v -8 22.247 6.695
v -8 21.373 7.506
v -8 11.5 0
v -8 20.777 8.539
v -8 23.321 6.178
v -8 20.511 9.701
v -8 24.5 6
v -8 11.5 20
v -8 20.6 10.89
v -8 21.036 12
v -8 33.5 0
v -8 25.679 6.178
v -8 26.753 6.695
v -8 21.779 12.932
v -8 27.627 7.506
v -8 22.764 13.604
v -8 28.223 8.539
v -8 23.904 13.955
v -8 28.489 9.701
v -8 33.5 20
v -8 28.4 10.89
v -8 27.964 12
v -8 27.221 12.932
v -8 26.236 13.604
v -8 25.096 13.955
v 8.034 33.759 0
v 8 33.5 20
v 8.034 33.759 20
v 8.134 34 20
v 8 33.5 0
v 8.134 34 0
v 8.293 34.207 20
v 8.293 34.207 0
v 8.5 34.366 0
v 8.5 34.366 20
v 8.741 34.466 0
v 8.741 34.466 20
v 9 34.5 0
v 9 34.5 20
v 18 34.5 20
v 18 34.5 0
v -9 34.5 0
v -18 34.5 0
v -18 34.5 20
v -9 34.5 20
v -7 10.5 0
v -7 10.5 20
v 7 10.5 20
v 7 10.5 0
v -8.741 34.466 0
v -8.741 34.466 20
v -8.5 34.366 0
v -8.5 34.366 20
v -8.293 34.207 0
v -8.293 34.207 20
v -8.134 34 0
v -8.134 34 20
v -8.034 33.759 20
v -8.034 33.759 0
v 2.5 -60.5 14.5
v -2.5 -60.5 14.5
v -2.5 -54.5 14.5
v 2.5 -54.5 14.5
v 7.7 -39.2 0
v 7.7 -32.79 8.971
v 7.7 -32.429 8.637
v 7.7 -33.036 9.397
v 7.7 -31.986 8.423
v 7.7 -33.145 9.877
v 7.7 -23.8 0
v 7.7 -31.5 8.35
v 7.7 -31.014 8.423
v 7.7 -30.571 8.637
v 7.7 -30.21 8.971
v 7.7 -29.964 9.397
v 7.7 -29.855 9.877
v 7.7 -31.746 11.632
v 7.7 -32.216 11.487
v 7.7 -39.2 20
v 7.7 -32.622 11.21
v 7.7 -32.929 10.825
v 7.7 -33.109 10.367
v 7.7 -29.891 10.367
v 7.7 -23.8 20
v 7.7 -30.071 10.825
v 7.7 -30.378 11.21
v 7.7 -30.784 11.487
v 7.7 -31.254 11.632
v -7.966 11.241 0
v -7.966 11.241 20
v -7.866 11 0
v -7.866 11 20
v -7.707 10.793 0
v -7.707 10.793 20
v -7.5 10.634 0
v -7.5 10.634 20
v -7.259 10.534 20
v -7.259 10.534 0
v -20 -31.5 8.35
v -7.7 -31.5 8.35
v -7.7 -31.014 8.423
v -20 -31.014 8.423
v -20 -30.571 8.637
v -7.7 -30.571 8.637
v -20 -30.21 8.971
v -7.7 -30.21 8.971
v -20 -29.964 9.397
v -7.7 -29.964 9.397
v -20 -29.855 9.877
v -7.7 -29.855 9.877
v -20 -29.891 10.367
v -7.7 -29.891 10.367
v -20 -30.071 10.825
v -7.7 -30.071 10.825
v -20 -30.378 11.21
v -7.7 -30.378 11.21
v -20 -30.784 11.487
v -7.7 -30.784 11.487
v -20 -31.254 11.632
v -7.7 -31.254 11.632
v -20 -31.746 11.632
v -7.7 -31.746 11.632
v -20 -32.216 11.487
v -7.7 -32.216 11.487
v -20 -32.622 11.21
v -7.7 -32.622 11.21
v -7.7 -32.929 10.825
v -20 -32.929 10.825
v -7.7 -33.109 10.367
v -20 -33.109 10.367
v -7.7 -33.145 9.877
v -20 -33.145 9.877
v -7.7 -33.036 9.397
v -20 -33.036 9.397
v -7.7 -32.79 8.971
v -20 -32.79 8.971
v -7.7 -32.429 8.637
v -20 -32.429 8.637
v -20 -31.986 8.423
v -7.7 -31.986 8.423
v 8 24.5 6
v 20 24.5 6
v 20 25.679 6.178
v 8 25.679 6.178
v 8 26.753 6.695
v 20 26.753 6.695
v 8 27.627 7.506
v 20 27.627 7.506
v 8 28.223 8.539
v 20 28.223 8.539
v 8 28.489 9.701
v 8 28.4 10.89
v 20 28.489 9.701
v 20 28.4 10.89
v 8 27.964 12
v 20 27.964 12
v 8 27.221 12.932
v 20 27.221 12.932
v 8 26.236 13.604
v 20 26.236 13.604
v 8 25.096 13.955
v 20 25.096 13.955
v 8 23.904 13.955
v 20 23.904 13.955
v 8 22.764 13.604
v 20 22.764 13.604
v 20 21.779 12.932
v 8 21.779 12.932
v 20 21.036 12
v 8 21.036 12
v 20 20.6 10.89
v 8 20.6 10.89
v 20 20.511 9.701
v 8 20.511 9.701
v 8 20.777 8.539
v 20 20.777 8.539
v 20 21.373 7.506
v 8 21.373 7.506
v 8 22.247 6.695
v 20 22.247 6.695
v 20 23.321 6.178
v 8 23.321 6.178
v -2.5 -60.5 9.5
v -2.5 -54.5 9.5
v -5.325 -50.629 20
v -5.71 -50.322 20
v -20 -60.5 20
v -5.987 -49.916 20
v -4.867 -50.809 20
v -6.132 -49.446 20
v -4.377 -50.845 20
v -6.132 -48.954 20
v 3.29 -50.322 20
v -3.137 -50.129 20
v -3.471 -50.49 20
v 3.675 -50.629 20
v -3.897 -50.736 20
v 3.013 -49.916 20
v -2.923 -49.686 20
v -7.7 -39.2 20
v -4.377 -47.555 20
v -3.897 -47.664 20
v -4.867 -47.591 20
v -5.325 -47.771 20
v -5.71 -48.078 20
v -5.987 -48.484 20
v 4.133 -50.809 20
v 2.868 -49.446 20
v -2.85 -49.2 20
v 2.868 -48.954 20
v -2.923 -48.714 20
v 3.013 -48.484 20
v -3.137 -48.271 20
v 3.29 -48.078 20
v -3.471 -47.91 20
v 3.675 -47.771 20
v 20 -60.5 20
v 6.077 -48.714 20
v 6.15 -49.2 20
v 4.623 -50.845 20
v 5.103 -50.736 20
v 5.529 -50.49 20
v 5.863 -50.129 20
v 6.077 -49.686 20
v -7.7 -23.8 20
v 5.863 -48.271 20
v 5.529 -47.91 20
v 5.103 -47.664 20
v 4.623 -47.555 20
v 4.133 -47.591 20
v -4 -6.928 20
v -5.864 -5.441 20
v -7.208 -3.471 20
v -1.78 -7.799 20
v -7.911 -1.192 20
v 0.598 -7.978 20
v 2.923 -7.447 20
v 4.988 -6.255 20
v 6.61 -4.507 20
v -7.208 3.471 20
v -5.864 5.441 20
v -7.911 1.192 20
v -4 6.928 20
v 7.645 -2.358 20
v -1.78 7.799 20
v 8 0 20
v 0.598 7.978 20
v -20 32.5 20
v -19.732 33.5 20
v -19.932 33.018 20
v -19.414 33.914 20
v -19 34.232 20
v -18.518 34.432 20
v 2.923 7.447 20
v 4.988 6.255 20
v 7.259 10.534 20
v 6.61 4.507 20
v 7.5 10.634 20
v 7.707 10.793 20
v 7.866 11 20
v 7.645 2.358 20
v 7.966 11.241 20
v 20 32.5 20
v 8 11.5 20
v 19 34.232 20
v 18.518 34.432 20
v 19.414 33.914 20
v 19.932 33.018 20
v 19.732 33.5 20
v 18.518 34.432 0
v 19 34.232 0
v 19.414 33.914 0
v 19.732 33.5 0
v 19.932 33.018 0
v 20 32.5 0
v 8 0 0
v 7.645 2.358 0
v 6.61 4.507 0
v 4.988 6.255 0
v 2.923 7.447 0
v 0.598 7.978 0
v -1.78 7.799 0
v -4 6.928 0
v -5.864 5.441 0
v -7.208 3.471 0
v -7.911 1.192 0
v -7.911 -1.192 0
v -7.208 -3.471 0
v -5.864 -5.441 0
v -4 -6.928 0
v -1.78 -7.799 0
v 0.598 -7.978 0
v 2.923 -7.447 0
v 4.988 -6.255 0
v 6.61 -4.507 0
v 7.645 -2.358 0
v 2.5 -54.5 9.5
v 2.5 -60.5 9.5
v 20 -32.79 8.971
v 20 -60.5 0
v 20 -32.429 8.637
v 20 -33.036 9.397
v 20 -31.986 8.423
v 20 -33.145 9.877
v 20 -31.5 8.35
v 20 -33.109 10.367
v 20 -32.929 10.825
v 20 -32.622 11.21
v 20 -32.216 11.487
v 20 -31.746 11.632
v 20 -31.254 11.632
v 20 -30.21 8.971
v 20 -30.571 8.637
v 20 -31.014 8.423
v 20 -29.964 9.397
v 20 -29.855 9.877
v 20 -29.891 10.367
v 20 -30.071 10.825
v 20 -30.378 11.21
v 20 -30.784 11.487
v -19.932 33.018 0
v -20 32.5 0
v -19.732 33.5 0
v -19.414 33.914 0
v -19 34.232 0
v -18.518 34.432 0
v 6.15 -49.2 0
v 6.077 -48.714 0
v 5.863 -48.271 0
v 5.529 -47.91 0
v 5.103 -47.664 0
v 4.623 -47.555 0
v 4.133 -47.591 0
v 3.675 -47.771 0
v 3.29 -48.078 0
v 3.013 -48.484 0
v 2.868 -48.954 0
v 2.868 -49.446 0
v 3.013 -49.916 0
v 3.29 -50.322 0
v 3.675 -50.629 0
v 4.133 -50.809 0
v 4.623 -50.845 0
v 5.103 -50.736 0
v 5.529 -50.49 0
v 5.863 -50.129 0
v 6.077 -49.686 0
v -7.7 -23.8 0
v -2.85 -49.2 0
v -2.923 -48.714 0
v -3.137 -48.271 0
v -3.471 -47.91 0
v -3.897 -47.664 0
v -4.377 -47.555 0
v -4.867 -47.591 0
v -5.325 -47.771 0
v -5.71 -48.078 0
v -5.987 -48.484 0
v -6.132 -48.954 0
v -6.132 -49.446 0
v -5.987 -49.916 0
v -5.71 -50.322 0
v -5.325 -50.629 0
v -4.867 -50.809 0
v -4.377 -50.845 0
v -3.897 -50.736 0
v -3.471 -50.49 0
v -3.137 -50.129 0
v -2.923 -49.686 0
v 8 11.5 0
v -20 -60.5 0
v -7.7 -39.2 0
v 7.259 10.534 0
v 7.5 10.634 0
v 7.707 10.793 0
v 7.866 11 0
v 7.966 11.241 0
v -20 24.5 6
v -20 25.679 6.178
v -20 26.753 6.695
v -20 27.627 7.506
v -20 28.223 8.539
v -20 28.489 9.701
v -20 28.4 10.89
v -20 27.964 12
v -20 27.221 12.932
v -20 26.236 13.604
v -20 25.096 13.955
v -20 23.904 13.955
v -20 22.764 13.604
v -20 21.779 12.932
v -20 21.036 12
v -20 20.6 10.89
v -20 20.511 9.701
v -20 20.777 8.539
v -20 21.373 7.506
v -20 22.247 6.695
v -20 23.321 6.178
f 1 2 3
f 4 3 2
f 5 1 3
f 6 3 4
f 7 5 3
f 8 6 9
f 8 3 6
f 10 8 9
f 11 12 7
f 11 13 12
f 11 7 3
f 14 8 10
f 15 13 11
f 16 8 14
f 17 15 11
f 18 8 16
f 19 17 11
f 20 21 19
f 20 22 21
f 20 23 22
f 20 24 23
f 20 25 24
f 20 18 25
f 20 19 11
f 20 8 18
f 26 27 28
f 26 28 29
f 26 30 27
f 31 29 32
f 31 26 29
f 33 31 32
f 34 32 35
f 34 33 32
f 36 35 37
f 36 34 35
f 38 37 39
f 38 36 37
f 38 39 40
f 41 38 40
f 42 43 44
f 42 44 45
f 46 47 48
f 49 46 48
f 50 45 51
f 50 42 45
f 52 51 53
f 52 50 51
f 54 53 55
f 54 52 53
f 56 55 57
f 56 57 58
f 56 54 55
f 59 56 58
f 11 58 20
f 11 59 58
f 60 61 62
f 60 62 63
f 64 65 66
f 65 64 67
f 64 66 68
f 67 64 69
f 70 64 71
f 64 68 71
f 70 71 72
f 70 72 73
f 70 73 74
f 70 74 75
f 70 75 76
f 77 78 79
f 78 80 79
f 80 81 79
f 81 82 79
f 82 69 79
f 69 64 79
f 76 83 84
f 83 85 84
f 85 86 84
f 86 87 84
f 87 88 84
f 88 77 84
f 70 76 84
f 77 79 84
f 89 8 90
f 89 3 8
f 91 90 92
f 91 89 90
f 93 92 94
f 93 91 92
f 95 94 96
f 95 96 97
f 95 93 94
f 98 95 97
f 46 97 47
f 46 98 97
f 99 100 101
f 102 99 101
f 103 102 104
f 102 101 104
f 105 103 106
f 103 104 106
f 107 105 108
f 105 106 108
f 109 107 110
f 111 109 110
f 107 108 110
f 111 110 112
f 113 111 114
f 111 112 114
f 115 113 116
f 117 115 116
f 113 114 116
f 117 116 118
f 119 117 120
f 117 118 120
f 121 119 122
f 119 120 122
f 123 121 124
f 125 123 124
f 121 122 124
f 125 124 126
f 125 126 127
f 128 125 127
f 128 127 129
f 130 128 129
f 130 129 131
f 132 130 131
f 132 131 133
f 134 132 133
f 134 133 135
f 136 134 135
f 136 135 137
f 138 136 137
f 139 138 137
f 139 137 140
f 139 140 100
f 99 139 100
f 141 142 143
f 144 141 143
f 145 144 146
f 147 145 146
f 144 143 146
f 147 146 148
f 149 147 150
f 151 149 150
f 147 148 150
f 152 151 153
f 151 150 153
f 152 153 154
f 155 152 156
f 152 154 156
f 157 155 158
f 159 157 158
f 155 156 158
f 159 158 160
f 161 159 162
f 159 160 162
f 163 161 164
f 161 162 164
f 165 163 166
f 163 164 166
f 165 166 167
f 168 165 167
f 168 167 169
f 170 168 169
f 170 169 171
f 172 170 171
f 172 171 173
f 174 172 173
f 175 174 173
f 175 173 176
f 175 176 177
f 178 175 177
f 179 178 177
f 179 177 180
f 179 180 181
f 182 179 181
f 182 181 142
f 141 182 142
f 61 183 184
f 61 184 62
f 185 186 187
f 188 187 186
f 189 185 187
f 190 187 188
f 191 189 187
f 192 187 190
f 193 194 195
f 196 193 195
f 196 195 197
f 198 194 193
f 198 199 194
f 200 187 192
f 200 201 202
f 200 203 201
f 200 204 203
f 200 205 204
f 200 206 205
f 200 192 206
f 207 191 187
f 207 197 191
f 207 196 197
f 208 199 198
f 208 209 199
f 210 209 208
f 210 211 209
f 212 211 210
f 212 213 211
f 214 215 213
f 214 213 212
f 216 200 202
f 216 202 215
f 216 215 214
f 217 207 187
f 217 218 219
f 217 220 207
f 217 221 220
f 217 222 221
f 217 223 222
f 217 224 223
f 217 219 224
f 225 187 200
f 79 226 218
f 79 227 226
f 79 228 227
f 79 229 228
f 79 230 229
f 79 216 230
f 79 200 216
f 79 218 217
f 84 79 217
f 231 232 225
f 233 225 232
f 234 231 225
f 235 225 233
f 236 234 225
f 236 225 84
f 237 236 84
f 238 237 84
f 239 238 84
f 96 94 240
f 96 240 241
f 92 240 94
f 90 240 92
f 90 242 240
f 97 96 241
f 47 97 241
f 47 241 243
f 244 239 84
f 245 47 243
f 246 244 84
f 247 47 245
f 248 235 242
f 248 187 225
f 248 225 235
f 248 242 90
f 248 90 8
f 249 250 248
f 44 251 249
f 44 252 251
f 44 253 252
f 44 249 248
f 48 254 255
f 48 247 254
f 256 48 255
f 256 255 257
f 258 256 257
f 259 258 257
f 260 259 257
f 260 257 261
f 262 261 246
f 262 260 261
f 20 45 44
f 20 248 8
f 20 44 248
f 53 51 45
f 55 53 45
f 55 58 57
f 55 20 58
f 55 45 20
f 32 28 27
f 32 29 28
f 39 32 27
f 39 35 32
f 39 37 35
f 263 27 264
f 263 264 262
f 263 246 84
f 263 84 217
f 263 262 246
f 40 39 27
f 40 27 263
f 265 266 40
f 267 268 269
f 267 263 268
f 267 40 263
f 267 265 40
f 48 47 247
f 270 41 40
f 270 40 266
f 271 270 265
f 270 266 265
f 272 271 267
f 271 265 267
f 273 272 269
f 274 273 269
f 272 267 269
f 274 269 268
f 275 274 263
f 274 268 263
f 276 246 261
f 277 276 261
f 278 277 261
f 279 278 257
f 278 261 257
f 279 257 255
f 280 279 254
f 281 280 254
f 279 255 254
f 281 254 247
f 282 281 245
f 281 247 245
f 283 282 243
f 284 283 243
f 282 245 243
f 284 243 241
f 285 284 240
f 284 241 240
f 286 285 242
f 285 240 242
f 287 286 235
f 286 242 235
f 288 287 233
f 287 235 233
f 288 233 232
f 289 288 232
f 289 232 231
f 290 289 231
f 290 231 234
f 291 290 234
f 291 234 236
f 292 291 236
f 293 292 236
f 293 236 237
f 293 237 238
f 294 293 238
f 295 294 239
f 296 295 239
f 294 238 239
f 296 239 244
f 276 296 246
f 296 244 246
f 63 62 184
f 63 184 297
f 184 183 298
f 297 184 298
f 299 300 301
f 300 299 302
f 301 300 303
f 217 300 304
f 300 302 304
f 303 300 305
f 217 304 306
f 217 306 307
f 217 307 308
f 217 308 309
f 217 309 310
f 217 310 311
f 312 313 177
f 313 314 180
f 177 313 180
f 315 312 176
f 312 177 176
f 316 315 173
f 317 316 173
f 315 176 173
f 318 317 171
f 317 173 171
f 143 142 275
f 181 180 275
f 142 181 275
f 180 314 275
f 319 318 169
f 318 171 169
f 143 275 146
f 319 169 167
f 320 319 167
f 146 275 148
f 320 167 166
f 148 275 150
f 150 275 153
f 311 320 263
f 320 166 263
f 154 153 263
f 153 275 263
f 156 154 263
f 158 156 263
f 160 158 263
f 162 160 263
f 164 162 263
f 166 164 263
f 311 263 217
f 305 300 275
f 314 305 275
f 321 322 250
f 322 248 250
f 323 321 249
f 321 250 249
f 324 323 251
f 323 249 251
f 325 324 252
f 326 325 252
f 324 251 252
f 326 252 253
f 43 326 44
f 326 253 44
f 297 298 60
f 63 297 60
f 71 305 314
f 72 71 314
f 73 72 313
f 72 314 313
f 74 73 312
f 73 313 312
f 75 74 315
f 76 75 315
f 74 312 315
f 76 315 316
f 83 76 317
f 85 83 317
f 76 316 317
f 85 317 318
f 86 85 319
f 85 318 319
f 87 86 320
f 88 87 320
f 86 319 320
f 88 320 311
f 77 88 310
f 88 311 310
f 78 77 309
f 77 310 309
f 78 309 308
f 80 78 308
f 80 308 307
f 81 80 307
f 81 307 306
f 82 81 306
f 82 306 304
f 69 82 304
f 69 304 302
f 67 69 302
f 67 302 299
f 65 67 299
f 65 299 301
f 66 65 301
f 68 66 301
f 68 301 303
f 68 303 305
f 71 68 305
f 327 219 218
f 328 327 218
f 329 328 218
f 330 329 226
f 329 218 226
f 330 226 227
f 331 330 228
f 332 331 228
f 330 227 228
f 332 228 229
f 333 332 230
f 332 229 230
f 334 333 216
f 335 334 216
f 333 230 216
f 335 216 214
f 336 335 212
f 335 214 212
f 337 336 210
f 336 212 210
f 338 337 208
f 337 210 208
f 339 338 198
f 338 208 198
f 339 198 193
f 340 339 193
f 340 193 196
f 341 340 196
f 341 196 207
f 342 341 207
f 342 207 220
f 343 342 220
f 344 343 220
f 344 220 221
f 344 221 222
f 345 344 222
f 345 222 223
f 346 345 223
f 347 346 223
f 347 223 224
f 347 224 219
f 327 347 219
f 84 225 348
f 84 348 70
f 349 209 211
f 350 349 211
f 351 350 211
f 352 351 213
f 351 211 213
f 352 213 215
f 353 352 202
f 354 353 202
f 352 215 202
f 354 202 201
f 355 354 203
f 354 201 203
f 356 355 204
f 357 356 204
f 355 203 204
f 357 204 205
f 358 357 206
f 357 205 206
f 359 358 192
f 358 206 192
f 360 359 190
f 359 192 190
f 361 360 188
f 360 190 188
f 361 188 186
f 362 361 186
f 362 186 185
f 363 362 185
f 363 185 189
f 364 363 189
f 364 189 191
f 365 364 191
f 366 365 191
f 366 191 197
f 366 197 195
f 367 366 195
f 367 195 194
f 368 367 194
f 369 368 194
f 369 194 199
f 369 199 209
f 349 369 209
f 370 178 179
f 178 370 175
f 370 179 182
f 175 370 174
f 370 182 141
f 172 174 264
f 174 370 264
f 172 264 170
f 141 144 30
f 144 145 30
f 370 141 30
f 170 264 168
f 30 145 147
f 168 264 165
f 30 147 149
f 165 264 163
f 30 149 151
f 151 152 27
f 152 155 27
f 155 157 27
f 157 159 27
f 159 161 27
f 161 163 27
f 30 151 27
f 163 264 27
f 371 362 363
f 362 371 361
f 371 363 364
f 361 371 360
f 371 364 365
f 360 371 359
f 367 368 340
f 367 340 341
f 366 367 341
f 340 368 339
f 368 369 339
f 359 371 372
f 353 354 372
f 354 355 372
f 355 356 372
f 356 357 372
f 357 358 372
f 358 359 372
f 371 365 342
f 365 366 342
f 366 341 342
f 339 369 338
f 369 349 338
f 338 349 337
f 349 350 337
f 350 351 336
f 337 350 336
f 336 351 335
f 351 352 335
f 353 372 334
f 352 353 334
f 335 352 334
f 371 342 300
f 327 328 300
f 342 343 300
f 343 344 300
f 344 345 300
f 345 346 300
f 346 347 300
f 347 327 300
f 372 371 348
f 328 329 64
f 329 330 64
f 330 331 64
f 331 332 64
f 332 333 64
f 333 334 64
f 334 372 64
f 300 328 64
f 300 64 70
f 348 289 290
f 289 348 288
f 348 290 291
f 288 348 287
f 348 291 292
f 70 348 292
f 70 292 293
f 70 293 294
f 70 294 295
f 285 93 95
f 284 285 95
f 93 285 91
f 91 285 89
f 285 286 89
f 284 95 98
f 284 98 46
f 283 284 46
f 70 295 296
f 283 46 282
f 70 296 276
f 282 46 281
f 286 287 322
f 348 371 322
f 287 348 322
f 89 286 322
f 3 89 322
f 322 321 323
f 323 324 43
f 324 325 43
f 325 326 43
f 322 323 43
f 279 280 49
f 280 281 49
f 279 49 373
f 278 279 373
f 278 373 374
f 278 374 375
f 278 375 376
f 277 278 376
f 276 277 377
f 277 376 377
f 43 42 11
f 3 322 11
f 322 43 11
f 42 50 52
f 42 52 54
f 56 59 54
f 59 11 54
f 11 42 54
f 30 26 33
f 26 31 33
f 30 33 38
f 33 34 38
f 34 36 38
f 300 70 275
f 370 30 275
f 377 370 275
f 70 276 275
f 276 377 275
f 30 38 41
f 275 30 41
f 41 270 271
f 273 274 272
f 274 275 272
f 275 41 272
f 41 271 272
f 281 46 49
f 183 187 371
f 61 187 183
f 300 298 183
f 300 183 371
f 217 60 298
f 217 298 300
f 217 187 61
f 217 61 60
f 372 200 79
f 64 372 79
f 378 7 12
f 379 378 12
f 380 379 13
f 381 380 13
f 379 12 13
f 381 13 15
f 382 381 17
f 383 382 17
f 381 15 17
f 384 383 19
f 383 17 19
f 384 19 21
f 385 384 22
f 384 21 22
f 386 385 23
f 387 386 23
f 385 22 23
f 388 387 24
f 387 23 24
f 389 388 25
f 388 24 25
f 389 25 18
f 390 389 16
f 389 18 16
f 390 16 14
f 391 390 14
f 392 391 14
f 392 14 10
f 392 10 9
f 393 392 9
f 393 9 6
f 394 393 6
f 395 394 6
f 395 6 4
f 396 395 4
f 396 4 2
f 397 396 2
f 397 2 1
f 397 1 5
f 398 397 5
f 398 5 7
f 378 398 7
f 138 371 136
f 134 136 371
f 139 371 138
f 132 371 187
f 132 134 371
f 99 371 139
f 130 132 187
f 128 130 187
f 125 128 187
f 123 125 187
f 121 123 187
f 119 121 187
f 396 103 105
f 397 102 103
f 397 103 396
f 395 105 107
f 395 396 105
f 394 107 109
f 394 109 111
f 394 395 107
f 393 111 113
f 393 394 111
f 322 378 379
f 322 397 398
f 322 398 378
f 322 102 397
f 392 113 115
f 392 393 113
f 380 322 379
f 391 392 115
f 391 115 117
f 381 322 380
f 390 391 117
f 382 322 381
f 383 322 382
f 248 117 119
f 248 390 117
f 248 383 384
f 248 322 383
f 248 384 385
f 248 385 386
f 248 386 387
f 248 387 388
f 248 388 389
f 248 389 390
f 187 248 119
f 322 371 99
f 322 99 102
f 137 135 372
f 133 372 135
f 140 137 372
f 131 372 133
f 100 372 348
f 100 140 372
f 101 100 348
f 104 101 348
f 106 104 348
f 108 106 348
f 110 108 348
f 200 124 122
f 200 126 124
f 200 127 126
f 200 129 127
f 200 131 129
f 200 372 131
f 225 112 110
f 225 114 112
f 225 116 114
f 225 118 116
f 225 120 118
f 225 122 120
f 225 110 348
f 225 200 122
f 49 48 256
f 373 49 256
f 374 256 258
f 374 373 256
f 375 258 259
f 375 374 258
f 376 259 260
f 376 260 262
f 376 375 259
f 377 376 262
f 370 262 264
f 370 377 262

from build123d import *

# Parameters (mm, degrees)
SKETCH_1_W          = 40
SKETCH_1_H          = 69
EXTRUDE_1_DEPTH     = 20
SKETCH_2_R          = 8
CUT_EXTRUDE_1_DEPTH = 20
SKETCH_3_W          = 40
SKETCH_3_H          = 20
EXTRUDE_2_DEPTH     = 26
SKETCH_8_W          = 15.4
SKETCH_8_H          = 15.4
CUT_EXTRUDE_6_DEPTH = 100
SKETCH_4_R          = 1.65
CUT_EXTRUDE_2_DEPTH = 40
SKETCH_5_W          = 5
SKETCH_5_H          = 5
CUT_EXTRUDE_3_DEPTH = 6
FILLET_1_R          = 2
SKETCH_6_W          = 16
SKETCH_6_H          = 24
CUT_EXTRUDE_4_DEPTH = 50
SKETCH_7_R          = 4
CUT_EXTRUDE_5_DEPTH = 100
FILLET_2_R          = 1
SKETCH_9_R          = 1.65
CUT_EXTRUDE_7_DEPTH = 1000


with BuildPart() as part:
    # 草图1 → 凸台-拉伸1 (new body)
    with BuildSketch(Plane.XY):
        Rectangle(SKETCH_1_W, SKETCH_1_H)
    extrude(amount=EXTRUDE_1_DEPTH)

    # 草图2 → 切除-拉伸1 (cut)
    with BuildSketch(Plane.XY.offset(20)):
        Circle(SKETCH_2_R)
    extrude(amount=-CUT_EXTRUDE_1_DEPTH, mode=Mode.SUBTRACT)

    # 草图3 → 凸台-拉伸2 (add)
    with BuildSketch(Plane.XZ.offset(34.5)):
        with Locations((0, 10)):
            Rectangle(SKETCH_3_W, SKETCH_3_H)
    extrude(amount=EXTRUDE_2_DEPTH)

    # 草图8 → 切除-拉伸6 (cut)
    with BuildSketch(Plane.XY.offset(20)):
        with Locations((0, -31.5)):
            Rectangle(SKETCH_8_W, SKETCH_8_H)
    extrude(amount=-CUT_EXTRUDE_6_DEPTH, mode=Mode.SUBTRACT)

    # 草图4 → 切除-拉伸2 (cut)
    with BuildSketch(Plane.XY.offset(20)):
        with Locations((4.5, -49.2)):
            Circle(SKETCH_4_R)
        with Locations((-4.5, -49.2)):
            Circle(SKETCH_4_R)
    extrude(amount=-CUT_EXTRUDE_2_DEPTH, mode=Mode.SUBTRACT)

    # 草图5 → 切除-拉伸3 (cut)
    with BuildSketch(Plane.XZ.offset(60.5)):
        with Locations((0, 12)):
            Rectangle(SKETCH_5_W, SKETCH_5_H)
    extrude(amount=-CUT_EXTRUDE_3_DEPTH, mode=Mode.SUBTRACT)

    # 圆角1
    fillet_1_edges = [part.edges().sort_by_distance(p)[0] for p in [
        (-20, 34.5, 10),
        (20, 34.5, 10),
    ]]
    fillet(fillet_1_edges, radius=FILLET_1_R)

    # 草图6 → 切除-拉伸4 (cut)
    with BuildSketch(Plane.XY.offset(20)):
        with Locations((0, 22.5)):
            Rectangle(SKETCH_6_W, SKETCH_6_H)
    extrude(amount=-CUT_EXTRUDE_4_DEPTH, mode=Mode.SUBTRACT)

    # 草图7 → 切除-拉伸5 (cut)
    with BuildSketch(Plane(origin=(20, 0, 0), x_dir=(0, 0, -1), z_dir=(1, 0, 0))):
        with Locations((-10, 24.5)):
            Circle(SKETCH_7_R)
    extrude(amount=-CUT_EXTRUDE_5_DEPTH, mode=Mode.SUBTRACT)

    # 圆角2
    fillet_2_edges = [part.edges().sort_by_distance(p)[0] for p in [
        (-8, 34.5, 10),
        (8, 34.5, 10),
        (8, 10.5, 10),
        (-8, 10.5, 10),
    ]]
    fillet(fillet_2_edges, radius=FILLET_2_R)

    # 草图9 → 切除-拉伸7 (cut)
    with BuildSketch(Plane(origin=(20, 0, 0), x_dir=(0, 0, -1), z_dir=(1, 0, 0))):
        with Locations((-10, -31.5)):
            Circle(SKETCH_9_R)
    extrude(amount=-CUT_EXTRUDE_7_DEPTH, mode=Mode.SUBTRACT)


solid = part.part
